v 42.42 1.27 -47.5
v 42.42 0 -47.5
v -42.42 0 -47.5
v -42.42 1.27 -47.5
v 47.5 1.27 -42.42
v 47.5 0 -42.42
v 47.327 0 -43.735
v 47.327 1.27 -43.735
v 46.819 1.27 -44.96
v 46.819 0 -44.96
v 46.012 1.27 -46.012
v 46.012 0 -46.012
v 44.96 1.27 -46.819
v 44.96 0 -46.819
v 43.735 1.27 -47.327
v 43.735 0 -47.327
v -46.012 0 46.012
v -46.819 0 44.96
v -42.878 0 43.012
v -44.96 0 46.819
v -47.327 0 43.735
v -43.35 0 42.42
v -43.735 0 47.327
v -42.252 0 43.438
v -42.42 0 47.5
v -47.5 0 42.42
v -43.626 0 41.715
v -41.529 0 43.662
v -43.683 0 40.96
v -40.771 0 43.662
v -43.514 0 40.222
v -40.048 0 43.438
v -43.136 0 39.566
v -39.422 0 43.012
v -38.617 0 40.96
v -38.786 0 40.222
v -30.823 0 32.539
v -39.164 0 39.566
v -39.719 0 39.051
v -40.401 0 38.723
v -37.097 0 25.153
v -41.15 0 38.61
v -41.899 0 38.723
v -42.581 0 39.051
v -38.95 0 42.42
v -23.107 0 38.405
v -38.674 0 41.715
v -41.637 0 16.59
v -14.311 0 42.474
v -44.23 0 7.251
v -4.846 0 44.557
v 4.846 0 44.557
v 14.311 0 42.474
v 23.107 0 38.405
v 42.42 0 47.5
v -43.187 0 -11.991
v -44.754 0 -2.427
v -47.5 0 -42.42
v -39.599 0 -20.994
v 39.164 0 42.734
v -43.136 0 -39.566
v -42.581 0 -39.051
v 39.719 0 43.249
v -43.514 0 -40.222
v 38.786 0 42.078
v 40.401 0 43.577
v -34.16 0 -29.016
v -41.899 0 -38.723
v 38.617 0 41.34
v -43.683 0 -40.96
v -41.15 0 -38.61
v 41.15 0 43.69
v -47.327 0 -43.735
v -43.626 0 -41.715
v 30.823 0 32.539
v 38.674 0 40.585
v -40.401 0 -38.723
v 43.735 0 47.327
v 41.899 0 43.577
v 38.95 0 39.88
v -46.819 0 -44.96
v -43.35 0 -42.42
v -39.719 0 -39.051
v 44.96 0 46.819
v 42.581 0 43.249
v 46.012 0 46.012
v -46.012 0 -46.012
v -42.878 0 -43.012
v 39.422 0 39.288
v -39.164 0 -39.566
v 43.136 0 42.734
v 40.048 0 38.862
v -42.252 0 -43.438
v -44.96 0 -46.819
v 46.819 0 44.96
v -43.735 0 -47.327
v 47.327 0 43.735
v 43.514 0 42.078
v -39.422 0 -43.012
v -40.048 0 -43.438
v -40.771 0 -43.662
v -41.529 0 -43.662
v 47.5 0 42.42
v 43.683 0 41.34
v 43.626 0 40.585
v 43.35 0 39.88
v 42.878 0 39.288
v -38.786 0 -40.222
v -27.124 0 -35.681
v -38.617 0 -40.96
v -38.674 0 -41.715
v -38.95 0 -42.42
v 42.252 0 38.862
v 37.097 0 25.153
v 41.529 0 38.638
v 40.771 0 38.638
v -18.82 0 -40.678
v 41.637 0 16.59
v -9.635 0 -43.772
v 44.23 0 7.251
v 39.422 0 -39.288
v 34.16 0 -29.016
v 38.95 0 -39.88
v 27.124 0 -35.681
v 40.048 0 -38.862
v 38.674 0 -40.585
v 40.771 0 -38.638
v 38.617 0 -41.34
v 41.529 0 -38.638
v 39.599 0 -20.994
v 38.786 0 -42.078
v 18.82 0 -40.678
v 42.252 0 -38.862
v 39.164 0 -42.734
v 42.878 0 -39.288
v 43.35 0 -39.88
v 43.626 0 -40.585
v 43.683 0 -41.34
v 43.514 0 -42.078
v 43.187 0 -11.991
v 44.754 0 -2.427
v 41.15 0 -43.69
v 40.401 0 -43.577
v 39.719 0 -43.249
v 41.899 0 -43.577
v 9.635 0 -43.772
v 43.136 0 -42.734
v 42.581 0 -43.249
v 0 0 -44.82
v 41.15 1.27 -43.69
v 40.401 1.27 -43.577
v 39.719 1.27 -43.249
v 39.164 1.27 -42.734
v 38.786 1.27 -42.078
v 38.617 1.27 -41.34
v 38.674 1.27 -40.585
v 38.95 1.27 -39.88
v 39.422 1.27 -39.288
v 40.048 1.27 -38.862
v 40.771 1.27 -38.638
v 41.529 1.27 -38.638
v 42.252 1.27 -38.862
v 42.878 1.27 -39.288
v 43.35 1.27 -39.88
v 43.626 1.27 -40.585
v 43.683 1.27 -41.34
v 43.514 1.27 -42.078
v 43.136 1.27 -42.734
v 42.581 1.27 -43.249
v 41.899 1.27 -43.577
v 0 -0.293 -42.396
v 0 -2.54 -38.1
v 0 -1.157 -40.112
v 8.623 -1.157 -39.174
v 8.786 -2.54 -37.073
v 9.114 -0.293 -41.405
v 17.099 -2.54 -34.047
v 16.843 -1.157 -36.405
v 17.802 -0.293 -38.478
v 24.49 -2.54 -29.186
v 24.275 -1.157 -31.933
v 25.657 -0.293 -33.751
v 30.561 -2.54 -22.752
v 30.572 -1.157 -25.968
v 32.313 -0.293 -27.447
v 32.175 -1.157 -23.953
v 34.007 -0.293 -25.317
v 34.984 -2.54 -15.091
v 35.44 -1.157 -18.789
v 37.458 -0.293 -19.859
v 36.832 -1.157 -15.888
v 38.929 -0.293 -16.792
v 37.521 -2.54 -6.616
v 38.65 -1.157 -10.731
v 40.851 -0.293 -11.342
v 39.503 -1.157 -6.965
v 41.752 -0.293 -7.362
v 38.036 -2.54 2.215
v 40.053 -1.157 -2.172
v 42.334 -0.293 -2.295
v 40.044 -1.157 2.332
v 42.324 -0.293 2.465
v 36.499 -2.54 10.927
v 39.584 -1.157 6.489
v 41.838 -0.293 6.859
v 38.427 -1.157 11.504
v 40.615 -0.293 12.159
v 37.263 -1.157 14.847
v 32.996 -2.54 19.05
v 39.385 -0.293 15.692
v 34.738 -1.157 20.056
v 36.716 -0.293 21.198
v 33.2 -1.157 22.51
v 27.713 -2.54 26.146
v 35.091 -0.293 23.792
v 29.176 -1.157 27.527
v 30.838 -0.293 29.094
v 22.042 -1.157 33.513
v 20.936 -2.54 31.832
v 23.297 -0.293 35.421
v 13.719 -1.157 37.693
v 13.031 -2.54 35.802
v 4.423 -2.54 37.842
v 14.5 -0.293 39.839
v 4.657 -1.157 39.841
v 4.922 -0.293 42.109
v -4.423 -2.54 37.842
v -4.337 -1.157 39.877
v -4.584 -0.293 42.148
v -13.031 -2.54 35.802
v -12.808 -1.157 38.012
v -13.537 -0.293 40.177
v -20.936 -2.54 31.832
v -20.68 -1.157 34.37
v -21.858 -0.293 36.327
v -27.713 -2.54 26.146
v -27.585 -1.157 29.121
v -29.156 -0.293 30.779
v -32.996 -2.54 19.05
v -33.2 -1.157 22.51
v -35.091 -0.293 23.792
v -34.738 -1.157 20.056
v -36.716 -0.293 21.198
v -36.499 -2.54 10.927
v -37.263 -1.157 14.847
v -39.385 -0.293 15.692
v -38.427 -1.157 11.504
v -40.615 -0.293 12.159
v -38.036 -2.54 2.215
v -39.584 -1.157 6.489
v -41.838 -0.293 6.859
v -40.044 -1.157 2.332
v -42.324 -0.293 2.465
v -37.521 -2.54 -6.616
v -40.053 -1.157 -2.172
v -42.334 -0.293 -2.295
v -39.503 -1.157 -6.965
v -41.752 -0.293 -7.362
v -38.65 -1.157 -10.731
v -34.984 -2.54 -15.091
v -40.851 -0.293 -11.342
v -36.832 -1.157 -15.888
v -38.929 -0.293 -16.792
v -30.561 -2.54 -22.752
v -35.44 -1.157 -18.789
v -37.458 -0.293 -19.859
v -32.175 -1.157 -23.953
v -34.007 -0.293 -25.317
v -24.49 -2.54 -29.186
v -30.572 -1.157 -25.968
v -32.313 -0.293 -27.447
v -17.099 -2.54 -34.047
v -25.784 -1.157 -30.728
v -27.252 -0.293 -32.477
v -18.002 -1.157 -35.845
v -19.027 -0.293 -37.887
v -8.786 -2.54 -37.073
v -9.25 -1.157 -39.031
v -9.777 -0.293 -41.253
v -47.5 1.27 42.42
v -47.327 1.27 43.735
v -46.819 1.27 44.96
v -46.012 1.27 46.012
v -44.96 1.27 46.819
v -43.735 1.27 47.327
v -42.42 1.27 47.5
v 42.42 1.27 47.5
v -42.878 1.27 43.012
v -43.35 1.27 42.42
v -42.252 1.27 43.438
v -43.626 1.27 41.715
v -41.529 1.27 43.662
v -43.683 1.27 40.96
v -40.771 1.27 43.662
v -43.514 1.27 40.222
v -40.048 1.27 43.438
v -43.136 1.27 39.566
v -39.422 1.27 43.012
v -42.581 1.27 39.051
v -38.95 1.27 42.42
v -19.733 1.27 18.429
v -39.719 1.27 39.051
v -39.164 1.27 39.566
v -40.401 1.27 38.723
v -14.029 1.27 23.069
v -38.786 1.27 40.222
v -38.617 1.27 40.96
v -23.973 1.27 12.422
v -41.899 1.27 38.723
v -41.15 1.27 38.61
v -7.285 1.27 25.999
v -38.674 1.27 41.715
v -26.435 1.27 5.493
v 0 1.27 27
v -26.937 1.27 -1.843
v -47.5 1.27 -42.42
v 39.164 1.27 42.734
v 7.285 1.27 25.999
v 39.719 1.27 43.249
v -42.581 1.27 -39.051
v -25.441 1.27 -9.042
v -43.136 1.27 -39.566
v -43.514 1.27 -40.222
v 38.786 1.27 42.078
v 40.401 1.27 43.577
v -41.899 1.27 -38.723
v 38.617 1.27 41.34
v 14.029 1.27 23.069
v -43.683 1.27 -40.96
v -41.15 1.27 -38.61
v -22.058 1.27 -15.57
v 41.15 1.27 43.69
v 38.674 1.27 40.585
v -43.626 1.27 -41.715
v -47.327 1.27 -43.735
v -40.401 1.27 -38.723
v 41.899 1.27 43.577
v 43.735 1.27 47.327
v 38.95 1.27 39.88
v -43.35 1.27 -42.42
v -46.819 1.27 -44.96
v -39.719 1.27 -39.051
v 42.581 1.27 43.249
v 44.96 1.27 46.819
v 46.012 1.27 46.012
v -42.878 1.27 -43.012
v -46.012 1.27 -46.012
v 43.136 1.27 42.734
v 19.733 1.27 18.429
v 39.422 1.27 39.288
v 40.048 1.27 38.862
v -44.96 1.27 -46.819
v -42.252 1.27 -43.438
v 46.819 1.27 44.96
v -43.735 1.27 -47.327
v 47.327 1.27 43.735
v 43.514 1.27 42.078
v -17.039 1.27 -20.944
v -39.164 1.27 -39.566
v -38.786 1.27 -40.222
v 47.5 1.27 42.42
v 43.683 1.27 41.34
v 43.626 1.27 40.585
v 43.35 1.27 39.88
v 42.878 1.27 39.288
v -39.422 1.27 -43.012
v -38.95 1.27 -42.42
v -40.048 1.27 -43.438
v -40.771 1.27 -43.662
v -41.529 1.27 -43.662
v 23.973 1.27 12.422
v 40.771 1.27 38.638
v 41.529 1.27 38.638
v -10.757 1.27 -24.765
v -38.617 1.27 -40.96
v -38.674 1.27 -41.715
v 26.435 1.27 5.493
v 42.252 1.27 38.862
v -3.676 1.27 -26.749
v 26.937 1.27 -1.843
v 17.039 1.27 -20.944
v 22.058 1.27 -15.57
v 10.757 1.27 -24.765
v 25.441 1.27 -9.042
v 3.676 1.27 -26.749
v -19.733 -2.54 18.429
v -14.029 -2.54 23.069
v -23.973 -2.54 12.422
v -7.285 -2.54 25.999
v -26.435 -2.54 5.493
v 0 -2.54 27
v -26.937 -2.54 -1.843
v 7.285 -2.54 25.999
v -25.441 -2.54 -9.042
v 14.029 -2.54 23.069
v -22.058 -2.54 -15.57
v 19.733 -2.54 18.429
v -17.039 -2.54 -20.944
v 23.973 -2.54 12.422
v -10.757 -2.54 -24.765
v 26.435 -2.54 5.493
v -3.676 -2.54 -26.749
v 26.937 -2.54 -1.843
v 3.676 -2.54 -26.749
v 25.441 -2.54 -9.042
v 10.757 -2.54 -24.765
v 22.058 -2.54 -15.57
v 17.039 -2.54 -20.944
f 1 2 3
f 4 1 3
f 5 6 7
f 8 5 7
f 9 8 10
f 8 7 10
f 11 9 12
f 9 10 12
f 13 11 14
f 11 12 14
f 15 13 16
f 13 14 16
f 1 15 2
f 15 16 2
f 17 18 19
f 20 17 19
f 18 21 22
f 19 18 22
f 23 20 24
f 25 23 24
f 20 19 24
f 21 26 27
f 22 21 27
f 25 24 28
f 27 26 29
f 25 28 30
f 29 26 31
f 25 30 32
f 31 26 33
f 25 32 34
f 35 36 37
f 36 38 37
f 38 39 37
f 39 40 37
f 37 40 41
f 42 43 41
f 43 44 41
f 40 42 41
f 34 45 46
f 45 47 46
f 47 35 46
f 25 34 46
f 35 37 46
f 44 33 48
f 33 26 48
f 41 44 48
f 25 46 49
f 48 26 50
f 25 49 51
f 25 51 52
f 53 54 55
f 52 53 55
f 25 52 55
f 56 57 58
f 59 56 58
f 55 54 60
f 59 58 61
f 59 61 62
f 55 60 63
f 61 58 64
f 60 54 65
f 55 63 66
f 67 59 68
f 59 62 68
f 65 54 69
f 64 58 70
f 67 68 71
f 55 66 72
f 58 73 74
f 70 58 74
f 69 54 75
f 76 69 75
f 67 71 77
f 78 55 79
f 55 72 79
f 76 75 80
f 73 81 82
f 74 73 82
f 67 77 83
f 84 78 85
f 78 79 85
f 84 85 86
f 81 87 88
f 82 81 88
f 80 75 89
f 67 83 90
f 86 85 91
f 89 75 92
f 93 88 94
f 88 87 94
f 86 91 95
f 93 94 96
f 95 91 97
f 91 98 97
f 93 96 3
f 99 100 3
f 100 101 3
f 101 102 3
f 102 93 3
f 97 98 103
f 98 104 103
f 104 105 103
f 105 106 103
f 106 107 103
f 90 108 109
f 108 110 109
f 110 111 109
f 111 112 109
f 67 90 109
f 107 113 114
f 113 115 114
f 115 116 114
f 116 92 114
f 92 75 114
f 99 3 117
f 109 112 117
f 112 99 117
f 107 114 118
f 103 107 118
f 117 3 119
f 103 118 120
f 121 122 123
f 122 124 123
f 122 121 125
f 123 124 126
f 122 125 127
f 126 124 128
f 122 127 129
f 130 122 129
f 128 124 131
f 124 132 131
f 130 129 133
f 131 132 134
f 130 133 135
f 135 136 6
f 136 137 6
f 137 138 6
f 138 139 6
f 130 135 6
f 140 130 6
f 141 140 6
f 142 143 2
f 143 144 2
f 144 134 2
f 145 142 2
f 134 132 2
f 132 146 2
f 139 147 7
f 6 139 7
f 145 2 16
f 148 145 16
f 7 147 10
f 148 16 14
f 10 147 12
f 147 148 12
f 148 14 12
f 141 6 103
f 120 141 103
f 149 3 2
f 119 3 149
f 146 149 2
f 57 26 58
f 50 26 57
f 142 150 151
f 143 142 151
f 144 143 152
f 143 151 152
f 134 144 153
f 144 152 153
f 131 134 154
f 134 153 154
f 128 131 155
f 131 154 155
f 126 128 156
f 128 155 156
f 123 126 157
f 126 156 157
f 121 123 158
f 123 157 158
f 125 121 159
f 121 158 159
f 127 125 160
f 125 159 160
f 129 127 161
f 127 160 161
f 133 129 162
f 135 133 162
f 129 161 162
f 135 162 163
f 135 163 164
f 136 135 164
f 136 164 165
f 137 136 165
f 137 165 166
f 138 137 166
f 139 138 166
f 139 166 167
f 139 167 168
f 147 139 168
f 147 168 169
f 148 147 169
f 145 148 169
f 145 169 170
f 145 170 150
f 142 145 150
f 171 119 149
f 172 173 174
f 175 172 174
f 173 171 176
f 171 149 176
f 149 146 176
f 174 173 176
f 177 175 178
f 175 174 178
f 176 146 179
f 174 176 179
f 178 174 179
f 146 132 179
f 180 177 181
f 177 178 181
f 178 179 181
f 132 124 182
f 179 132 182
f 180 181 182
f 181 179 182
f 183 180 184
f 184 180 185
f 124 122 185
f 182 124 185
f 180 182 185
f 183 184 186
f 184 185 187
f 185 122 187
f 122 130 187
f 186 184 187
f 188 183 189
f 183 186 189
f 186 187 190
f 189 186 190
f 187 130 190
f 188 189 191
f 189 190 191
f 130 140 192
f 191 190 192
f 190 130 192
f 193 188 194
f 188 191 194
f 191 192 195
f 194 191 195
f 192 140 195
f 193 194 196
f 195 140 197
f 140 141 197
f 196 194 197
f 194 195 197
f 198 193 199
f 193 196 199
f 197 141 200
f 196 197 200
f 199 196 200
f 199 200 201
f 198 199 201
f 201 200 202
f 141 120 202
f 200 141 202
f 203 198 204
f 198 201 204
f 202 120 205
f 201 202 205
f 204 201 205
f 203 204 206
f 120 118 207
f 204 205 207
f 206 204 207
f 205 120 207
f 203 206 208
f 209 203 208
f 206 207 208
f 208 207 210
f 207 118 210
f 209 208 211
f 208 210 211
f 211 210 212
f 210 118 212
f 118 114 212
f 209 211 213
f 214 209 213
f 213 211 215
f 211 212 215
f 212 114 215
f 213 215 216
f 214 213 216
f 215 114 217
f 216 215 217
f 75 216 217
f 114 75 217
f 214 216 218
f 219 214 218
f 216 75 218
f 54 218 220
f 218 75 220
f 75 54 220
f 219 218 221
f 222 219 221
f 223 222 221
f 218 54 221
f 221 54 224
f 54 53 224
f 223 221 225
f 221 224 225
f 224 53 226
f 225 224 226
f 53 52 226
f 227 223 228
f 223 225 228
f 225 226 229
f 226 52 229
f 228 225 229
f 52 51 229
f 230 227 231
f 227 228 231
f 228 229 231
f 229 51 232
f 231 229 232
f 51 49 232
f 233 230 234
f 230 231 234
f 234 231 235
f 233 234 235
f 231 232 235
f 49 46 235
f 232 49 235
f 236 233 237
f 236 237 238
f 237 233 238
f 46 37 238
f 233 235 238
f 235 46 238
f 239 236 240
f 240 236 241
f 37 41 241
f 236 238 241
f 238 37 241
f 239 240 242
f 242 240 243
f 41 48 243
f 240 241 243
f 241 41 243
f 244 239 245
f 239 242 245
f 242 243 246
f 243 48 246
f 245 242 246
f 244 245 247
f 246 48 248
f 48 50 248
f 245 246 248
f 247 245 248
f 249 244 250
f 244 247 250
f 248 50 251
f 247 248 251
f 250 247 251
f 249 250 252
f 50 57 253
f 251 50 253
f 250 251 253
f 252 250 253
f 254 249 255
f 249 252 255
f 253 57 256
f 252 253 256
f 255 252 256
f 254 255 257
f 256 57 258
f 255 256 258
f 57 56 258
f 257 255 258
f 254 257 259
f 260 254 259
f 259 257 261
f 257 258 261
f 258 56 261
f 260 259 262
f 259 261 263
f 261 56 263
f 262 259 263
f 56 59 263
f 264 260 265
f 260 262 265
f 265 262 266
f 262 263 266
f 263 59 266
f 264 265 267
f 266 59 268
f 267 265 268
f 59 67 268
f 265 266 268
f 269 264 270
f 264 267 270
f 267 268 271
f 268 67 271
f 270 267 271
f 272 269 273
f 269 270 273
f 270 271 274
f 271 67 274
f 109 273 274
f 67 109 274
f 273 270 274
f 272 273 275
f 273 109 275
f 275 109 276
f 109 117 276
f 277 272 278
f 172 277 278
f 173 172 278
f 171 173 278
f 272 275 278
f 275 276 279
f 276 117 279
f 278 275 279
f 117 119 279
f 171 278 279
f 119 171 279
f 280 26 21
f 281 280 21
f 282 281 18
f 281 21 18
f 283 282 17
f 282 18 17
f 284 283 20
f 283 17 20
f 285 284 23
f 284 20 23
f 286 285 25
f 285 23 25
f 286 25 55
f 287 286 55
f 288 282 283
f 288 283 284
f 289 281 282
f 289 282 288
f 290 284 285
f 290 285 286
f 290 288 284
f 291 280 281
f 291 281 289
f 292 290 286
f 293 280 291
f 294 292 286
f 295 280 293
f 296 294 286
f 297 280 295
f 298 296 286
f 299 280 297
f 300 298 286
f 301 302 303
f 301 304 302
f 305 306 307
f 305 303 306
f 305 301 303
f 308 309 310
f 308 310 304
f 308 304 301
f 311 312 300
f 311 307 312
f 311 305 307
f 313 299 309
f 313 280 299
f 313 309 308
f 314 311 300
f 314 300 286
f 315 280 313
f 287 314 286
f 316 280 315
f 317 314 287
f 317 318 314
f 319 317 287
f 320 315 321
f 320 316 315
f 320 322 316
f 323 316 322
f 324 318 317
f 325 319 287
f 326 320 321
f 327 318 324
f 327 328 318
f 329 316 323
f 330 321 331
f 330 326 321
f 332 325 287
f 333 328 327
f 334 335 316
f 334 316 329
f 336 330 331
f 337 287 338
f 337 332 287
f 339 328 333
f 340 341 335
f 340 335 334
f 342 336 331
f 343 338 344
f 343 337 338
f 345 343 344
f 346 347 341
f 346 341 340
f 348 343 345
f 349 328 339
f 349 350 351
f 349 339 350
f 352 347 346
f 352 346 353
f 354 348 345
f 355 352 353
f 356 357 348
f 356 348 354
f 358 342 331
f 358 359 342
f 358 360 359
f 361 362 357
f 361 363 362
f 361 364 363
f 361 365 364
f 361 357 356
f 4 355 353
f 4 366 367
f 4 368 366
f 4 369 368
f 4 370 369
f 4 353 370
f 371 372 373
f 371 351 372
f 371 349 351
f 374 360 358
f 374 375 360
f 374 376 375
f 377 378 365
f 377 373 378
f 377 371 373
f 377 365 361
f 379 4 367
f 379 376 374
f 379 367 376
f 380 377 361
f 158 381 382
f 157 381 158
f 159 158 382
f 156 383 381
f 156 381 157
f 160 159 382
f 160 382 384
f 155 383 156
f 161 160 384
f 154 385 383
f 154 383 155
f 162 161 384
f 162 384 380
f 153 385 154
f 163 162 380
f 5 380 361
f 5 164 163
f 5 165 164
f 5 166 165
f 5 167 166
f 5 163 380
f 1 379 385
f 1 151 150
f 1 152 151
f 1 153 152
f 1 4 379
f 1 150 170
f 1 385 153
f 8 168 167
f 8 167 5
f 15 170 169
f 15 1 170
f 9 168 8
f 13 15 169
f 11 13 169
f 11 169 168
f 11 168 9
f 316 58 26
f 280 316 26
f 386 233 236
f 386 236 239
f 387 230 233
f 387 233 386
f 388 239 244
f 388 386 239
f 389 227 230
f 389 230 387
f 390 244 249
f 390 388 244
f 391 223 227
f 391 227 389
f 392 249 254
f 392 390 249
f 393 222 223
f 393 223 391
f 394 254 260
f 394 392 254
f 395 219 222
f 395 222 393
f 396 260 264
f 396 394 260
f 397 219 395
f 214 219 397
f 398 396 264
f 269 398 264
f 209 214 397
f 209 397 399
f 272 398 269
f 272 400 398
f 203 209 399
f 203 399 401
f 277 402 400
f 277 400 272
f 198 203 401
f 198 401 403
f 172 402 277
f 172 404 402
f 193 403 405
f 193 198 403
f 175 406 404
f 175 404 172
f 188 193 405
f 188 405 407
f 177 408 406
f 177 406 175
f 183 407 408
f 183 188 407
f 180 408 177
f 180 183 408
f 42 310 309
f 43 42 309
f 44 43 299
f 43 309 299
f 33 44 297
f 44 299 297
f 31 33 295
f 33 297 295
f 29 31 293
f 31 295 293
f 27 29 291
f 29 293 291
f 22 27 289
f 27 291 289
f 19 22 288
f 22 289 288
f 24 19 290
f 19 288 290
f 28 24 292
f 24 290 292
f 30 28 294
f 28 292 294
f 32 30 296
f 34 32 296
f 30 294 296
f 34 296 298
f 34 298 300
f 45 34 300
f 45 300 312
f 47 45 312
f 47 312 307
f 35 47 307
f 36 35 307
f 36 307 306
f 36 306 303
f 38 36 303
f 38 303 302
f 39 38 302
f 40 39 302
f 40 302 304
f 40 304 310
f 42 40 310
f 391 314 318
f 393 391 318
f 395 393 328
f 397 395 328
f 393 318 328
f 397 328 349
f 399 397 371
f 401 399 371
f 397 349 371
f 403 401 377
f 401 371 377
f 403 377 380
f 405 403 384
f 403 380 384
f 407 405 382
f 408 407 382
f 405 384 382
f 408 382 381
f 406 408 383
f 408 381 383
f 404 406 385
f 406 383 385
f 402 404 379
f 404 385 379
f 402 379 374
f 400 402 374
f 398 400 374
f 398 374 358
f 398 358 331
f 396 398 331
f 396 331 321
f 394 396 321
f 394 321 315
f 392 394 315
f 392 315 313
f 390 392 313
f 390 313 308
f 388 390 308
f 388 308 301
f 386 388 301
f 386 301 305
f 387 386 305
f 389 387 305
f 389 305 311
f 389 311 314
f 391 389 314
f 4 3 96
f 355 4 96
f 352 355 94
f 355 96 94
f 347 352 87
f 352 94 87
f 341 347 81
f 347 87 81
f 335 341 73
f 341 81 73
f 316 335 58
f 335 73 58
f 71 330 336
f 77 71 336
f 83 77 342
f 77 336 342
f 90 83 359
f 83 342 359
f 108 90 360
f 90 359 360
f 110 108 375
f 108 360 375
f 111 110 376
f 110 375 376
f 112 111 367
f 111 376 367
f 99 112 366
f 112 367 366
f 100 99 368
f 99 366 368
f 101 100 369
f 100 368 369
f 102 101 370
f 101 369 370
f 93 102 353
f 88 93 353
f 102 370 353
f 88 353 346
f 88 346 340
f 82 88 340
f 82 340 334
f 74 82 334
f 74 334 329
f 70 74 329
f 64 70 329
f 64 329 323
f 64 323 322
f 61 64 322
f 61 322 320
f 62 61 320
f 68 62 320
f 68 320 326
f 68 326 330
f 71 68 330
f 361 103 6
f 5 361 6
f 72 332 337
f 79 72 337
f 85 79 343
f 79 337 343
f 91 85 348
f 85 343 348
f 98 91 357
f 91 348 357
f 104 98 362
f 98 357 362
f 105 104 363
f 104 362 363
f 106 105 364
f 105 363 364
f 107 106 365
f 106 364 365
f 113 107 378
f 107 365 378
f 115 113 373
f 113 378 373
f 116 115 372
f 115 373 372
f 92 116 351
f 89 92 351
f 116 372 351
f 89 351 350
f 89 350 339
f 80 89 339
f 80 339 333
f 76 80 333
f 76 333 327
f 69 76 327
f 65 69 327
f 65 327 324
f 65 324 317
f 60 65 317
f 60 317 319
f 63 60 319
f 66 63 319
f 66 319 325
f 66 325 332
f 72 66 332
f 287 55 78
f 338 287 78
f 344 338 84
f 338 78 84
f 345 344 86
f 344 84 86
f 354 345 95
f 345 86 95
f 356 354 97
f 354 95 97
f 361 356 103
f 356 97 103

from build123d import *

# Parameters (mm, degrees)
BOSS_EXTRUDE1_DEPTH = 1.27
SKETCH2_R           = 38.1
BOSS_EXTRUDE2_DEPTH = 2.54
FILLET1_R           = 10.16
SKETCH3_R           = 27
CUT_EXTRUDE1_DEPTH  = 68.28310412
SKETCH4_R           = 2.54
CUT_EXTRUDE2_DEPTH  = 68.28310412


with BuildPart() as part:
    # Sketch1 → Boss-Extrude1 (new body)
    with BuildSketch(Plane(origin=(0, 0, 0), x_dir=(1, 0, 0), z_dir=(0, 1, 0))):
        with BuildLine():
            Line((-42.42, -47.5), (42.42, -47.5))
            ThreePointArc((42.42, -47.5), (46.012102448, -46.012102448), (47.5, -42.42))
            Line((47.5, -42.42), (47.5, 42.42))
            ThreePointArc((47.5, 42.42), (46.012102448, 46.012102448), (42.42, 47.5))
            Line((42.42, 47.5), (-42.42, 47.5))
            ThreePointArc((-42.42, 47.5), (-46.012102448, 46.012102448), (-47.5, 42.42))
            Line((-47.5, 42.42), (-47.5, -42.42))
            ThreePointArc((-47.5, -42.42), (-46.012102448, -46.012102448), (-42.42, -47.5))
        make_face()
    extrude(amount=BOSS_EXTRUDE1_DEPTH)

    # Sketch2 → Boss-Extrude2 (add)
    with BuildSketch(Plane.XZ):
        with Locations(Location((0, 0, 0), (0, 0, 270))):
            Circle(SKETCH2_R)
    extrude(amount=BOSS_EXTRUDE2_DEPTH)

    # Fillet1
    # the kernel refuses this fillet: 10.16 mm, written as the material it adds along each edge
    with BuildSketch(Plane(origin=(0, 0, 0), x_dir=(0, 0, -1), z_dir=(-1, 0, 0))) as fillet1_piece_1:
        with BuildLine():
            CenterArc((44.82020833, 10.16), FILLET1_R, 228.590377891, 41.409622109)
            Line((38.1, 2.54), (38.1, 0))
            Line((38.1, 0), (44.82020833, 0))
        make_face()
    revolve(axis=Axis((0, 0, 0), (0, -1, 0)))

    # Sketch3 → Cut-Extrude1 (cut, through all)
    with BuildSketch(Plane(origin=(0, 1.27, 0), x_dir=(1, 0, 0), z_dir=(0, 1, 0))):
        with Locations(Location((0, 0, 0), (0, 0, 270))):
            Circle(SKETCH3_R)
    extrude(amount=-CUT_EXTRUDE1_DEPTH, mode=Mode.SUBTRACT)

    # Sketch4 → Cut-Extrude2 (cut, through all)
    with BuildSketch(Plane(origin=(0, 1.27, 0), x_dir=(1, 0, 0), z_dir=(0, 1, 0))):
        with Locations(Location((-41.15, 41.15, 0), (0, 0, 270))):
            Circle(SKETCH4_R)
        with Locations(Location((41.15, 41.15, 0), (0, 0, 90))):
            Circle(SKETCH4_R)
        with Locations(Location((-41.15, -41.15, 0), (0, 0, 90))):
            Circle(SKETCH4_R)
        with Locations(Location((41.15, -41.15, 0), (0, 0, 270))):
            Circle(SKETCH4_R)
    extrude(amount=-CUT_EXTRUDE2_DEPTH, mode=Mode.SUBTRACT)


solid = part.part
